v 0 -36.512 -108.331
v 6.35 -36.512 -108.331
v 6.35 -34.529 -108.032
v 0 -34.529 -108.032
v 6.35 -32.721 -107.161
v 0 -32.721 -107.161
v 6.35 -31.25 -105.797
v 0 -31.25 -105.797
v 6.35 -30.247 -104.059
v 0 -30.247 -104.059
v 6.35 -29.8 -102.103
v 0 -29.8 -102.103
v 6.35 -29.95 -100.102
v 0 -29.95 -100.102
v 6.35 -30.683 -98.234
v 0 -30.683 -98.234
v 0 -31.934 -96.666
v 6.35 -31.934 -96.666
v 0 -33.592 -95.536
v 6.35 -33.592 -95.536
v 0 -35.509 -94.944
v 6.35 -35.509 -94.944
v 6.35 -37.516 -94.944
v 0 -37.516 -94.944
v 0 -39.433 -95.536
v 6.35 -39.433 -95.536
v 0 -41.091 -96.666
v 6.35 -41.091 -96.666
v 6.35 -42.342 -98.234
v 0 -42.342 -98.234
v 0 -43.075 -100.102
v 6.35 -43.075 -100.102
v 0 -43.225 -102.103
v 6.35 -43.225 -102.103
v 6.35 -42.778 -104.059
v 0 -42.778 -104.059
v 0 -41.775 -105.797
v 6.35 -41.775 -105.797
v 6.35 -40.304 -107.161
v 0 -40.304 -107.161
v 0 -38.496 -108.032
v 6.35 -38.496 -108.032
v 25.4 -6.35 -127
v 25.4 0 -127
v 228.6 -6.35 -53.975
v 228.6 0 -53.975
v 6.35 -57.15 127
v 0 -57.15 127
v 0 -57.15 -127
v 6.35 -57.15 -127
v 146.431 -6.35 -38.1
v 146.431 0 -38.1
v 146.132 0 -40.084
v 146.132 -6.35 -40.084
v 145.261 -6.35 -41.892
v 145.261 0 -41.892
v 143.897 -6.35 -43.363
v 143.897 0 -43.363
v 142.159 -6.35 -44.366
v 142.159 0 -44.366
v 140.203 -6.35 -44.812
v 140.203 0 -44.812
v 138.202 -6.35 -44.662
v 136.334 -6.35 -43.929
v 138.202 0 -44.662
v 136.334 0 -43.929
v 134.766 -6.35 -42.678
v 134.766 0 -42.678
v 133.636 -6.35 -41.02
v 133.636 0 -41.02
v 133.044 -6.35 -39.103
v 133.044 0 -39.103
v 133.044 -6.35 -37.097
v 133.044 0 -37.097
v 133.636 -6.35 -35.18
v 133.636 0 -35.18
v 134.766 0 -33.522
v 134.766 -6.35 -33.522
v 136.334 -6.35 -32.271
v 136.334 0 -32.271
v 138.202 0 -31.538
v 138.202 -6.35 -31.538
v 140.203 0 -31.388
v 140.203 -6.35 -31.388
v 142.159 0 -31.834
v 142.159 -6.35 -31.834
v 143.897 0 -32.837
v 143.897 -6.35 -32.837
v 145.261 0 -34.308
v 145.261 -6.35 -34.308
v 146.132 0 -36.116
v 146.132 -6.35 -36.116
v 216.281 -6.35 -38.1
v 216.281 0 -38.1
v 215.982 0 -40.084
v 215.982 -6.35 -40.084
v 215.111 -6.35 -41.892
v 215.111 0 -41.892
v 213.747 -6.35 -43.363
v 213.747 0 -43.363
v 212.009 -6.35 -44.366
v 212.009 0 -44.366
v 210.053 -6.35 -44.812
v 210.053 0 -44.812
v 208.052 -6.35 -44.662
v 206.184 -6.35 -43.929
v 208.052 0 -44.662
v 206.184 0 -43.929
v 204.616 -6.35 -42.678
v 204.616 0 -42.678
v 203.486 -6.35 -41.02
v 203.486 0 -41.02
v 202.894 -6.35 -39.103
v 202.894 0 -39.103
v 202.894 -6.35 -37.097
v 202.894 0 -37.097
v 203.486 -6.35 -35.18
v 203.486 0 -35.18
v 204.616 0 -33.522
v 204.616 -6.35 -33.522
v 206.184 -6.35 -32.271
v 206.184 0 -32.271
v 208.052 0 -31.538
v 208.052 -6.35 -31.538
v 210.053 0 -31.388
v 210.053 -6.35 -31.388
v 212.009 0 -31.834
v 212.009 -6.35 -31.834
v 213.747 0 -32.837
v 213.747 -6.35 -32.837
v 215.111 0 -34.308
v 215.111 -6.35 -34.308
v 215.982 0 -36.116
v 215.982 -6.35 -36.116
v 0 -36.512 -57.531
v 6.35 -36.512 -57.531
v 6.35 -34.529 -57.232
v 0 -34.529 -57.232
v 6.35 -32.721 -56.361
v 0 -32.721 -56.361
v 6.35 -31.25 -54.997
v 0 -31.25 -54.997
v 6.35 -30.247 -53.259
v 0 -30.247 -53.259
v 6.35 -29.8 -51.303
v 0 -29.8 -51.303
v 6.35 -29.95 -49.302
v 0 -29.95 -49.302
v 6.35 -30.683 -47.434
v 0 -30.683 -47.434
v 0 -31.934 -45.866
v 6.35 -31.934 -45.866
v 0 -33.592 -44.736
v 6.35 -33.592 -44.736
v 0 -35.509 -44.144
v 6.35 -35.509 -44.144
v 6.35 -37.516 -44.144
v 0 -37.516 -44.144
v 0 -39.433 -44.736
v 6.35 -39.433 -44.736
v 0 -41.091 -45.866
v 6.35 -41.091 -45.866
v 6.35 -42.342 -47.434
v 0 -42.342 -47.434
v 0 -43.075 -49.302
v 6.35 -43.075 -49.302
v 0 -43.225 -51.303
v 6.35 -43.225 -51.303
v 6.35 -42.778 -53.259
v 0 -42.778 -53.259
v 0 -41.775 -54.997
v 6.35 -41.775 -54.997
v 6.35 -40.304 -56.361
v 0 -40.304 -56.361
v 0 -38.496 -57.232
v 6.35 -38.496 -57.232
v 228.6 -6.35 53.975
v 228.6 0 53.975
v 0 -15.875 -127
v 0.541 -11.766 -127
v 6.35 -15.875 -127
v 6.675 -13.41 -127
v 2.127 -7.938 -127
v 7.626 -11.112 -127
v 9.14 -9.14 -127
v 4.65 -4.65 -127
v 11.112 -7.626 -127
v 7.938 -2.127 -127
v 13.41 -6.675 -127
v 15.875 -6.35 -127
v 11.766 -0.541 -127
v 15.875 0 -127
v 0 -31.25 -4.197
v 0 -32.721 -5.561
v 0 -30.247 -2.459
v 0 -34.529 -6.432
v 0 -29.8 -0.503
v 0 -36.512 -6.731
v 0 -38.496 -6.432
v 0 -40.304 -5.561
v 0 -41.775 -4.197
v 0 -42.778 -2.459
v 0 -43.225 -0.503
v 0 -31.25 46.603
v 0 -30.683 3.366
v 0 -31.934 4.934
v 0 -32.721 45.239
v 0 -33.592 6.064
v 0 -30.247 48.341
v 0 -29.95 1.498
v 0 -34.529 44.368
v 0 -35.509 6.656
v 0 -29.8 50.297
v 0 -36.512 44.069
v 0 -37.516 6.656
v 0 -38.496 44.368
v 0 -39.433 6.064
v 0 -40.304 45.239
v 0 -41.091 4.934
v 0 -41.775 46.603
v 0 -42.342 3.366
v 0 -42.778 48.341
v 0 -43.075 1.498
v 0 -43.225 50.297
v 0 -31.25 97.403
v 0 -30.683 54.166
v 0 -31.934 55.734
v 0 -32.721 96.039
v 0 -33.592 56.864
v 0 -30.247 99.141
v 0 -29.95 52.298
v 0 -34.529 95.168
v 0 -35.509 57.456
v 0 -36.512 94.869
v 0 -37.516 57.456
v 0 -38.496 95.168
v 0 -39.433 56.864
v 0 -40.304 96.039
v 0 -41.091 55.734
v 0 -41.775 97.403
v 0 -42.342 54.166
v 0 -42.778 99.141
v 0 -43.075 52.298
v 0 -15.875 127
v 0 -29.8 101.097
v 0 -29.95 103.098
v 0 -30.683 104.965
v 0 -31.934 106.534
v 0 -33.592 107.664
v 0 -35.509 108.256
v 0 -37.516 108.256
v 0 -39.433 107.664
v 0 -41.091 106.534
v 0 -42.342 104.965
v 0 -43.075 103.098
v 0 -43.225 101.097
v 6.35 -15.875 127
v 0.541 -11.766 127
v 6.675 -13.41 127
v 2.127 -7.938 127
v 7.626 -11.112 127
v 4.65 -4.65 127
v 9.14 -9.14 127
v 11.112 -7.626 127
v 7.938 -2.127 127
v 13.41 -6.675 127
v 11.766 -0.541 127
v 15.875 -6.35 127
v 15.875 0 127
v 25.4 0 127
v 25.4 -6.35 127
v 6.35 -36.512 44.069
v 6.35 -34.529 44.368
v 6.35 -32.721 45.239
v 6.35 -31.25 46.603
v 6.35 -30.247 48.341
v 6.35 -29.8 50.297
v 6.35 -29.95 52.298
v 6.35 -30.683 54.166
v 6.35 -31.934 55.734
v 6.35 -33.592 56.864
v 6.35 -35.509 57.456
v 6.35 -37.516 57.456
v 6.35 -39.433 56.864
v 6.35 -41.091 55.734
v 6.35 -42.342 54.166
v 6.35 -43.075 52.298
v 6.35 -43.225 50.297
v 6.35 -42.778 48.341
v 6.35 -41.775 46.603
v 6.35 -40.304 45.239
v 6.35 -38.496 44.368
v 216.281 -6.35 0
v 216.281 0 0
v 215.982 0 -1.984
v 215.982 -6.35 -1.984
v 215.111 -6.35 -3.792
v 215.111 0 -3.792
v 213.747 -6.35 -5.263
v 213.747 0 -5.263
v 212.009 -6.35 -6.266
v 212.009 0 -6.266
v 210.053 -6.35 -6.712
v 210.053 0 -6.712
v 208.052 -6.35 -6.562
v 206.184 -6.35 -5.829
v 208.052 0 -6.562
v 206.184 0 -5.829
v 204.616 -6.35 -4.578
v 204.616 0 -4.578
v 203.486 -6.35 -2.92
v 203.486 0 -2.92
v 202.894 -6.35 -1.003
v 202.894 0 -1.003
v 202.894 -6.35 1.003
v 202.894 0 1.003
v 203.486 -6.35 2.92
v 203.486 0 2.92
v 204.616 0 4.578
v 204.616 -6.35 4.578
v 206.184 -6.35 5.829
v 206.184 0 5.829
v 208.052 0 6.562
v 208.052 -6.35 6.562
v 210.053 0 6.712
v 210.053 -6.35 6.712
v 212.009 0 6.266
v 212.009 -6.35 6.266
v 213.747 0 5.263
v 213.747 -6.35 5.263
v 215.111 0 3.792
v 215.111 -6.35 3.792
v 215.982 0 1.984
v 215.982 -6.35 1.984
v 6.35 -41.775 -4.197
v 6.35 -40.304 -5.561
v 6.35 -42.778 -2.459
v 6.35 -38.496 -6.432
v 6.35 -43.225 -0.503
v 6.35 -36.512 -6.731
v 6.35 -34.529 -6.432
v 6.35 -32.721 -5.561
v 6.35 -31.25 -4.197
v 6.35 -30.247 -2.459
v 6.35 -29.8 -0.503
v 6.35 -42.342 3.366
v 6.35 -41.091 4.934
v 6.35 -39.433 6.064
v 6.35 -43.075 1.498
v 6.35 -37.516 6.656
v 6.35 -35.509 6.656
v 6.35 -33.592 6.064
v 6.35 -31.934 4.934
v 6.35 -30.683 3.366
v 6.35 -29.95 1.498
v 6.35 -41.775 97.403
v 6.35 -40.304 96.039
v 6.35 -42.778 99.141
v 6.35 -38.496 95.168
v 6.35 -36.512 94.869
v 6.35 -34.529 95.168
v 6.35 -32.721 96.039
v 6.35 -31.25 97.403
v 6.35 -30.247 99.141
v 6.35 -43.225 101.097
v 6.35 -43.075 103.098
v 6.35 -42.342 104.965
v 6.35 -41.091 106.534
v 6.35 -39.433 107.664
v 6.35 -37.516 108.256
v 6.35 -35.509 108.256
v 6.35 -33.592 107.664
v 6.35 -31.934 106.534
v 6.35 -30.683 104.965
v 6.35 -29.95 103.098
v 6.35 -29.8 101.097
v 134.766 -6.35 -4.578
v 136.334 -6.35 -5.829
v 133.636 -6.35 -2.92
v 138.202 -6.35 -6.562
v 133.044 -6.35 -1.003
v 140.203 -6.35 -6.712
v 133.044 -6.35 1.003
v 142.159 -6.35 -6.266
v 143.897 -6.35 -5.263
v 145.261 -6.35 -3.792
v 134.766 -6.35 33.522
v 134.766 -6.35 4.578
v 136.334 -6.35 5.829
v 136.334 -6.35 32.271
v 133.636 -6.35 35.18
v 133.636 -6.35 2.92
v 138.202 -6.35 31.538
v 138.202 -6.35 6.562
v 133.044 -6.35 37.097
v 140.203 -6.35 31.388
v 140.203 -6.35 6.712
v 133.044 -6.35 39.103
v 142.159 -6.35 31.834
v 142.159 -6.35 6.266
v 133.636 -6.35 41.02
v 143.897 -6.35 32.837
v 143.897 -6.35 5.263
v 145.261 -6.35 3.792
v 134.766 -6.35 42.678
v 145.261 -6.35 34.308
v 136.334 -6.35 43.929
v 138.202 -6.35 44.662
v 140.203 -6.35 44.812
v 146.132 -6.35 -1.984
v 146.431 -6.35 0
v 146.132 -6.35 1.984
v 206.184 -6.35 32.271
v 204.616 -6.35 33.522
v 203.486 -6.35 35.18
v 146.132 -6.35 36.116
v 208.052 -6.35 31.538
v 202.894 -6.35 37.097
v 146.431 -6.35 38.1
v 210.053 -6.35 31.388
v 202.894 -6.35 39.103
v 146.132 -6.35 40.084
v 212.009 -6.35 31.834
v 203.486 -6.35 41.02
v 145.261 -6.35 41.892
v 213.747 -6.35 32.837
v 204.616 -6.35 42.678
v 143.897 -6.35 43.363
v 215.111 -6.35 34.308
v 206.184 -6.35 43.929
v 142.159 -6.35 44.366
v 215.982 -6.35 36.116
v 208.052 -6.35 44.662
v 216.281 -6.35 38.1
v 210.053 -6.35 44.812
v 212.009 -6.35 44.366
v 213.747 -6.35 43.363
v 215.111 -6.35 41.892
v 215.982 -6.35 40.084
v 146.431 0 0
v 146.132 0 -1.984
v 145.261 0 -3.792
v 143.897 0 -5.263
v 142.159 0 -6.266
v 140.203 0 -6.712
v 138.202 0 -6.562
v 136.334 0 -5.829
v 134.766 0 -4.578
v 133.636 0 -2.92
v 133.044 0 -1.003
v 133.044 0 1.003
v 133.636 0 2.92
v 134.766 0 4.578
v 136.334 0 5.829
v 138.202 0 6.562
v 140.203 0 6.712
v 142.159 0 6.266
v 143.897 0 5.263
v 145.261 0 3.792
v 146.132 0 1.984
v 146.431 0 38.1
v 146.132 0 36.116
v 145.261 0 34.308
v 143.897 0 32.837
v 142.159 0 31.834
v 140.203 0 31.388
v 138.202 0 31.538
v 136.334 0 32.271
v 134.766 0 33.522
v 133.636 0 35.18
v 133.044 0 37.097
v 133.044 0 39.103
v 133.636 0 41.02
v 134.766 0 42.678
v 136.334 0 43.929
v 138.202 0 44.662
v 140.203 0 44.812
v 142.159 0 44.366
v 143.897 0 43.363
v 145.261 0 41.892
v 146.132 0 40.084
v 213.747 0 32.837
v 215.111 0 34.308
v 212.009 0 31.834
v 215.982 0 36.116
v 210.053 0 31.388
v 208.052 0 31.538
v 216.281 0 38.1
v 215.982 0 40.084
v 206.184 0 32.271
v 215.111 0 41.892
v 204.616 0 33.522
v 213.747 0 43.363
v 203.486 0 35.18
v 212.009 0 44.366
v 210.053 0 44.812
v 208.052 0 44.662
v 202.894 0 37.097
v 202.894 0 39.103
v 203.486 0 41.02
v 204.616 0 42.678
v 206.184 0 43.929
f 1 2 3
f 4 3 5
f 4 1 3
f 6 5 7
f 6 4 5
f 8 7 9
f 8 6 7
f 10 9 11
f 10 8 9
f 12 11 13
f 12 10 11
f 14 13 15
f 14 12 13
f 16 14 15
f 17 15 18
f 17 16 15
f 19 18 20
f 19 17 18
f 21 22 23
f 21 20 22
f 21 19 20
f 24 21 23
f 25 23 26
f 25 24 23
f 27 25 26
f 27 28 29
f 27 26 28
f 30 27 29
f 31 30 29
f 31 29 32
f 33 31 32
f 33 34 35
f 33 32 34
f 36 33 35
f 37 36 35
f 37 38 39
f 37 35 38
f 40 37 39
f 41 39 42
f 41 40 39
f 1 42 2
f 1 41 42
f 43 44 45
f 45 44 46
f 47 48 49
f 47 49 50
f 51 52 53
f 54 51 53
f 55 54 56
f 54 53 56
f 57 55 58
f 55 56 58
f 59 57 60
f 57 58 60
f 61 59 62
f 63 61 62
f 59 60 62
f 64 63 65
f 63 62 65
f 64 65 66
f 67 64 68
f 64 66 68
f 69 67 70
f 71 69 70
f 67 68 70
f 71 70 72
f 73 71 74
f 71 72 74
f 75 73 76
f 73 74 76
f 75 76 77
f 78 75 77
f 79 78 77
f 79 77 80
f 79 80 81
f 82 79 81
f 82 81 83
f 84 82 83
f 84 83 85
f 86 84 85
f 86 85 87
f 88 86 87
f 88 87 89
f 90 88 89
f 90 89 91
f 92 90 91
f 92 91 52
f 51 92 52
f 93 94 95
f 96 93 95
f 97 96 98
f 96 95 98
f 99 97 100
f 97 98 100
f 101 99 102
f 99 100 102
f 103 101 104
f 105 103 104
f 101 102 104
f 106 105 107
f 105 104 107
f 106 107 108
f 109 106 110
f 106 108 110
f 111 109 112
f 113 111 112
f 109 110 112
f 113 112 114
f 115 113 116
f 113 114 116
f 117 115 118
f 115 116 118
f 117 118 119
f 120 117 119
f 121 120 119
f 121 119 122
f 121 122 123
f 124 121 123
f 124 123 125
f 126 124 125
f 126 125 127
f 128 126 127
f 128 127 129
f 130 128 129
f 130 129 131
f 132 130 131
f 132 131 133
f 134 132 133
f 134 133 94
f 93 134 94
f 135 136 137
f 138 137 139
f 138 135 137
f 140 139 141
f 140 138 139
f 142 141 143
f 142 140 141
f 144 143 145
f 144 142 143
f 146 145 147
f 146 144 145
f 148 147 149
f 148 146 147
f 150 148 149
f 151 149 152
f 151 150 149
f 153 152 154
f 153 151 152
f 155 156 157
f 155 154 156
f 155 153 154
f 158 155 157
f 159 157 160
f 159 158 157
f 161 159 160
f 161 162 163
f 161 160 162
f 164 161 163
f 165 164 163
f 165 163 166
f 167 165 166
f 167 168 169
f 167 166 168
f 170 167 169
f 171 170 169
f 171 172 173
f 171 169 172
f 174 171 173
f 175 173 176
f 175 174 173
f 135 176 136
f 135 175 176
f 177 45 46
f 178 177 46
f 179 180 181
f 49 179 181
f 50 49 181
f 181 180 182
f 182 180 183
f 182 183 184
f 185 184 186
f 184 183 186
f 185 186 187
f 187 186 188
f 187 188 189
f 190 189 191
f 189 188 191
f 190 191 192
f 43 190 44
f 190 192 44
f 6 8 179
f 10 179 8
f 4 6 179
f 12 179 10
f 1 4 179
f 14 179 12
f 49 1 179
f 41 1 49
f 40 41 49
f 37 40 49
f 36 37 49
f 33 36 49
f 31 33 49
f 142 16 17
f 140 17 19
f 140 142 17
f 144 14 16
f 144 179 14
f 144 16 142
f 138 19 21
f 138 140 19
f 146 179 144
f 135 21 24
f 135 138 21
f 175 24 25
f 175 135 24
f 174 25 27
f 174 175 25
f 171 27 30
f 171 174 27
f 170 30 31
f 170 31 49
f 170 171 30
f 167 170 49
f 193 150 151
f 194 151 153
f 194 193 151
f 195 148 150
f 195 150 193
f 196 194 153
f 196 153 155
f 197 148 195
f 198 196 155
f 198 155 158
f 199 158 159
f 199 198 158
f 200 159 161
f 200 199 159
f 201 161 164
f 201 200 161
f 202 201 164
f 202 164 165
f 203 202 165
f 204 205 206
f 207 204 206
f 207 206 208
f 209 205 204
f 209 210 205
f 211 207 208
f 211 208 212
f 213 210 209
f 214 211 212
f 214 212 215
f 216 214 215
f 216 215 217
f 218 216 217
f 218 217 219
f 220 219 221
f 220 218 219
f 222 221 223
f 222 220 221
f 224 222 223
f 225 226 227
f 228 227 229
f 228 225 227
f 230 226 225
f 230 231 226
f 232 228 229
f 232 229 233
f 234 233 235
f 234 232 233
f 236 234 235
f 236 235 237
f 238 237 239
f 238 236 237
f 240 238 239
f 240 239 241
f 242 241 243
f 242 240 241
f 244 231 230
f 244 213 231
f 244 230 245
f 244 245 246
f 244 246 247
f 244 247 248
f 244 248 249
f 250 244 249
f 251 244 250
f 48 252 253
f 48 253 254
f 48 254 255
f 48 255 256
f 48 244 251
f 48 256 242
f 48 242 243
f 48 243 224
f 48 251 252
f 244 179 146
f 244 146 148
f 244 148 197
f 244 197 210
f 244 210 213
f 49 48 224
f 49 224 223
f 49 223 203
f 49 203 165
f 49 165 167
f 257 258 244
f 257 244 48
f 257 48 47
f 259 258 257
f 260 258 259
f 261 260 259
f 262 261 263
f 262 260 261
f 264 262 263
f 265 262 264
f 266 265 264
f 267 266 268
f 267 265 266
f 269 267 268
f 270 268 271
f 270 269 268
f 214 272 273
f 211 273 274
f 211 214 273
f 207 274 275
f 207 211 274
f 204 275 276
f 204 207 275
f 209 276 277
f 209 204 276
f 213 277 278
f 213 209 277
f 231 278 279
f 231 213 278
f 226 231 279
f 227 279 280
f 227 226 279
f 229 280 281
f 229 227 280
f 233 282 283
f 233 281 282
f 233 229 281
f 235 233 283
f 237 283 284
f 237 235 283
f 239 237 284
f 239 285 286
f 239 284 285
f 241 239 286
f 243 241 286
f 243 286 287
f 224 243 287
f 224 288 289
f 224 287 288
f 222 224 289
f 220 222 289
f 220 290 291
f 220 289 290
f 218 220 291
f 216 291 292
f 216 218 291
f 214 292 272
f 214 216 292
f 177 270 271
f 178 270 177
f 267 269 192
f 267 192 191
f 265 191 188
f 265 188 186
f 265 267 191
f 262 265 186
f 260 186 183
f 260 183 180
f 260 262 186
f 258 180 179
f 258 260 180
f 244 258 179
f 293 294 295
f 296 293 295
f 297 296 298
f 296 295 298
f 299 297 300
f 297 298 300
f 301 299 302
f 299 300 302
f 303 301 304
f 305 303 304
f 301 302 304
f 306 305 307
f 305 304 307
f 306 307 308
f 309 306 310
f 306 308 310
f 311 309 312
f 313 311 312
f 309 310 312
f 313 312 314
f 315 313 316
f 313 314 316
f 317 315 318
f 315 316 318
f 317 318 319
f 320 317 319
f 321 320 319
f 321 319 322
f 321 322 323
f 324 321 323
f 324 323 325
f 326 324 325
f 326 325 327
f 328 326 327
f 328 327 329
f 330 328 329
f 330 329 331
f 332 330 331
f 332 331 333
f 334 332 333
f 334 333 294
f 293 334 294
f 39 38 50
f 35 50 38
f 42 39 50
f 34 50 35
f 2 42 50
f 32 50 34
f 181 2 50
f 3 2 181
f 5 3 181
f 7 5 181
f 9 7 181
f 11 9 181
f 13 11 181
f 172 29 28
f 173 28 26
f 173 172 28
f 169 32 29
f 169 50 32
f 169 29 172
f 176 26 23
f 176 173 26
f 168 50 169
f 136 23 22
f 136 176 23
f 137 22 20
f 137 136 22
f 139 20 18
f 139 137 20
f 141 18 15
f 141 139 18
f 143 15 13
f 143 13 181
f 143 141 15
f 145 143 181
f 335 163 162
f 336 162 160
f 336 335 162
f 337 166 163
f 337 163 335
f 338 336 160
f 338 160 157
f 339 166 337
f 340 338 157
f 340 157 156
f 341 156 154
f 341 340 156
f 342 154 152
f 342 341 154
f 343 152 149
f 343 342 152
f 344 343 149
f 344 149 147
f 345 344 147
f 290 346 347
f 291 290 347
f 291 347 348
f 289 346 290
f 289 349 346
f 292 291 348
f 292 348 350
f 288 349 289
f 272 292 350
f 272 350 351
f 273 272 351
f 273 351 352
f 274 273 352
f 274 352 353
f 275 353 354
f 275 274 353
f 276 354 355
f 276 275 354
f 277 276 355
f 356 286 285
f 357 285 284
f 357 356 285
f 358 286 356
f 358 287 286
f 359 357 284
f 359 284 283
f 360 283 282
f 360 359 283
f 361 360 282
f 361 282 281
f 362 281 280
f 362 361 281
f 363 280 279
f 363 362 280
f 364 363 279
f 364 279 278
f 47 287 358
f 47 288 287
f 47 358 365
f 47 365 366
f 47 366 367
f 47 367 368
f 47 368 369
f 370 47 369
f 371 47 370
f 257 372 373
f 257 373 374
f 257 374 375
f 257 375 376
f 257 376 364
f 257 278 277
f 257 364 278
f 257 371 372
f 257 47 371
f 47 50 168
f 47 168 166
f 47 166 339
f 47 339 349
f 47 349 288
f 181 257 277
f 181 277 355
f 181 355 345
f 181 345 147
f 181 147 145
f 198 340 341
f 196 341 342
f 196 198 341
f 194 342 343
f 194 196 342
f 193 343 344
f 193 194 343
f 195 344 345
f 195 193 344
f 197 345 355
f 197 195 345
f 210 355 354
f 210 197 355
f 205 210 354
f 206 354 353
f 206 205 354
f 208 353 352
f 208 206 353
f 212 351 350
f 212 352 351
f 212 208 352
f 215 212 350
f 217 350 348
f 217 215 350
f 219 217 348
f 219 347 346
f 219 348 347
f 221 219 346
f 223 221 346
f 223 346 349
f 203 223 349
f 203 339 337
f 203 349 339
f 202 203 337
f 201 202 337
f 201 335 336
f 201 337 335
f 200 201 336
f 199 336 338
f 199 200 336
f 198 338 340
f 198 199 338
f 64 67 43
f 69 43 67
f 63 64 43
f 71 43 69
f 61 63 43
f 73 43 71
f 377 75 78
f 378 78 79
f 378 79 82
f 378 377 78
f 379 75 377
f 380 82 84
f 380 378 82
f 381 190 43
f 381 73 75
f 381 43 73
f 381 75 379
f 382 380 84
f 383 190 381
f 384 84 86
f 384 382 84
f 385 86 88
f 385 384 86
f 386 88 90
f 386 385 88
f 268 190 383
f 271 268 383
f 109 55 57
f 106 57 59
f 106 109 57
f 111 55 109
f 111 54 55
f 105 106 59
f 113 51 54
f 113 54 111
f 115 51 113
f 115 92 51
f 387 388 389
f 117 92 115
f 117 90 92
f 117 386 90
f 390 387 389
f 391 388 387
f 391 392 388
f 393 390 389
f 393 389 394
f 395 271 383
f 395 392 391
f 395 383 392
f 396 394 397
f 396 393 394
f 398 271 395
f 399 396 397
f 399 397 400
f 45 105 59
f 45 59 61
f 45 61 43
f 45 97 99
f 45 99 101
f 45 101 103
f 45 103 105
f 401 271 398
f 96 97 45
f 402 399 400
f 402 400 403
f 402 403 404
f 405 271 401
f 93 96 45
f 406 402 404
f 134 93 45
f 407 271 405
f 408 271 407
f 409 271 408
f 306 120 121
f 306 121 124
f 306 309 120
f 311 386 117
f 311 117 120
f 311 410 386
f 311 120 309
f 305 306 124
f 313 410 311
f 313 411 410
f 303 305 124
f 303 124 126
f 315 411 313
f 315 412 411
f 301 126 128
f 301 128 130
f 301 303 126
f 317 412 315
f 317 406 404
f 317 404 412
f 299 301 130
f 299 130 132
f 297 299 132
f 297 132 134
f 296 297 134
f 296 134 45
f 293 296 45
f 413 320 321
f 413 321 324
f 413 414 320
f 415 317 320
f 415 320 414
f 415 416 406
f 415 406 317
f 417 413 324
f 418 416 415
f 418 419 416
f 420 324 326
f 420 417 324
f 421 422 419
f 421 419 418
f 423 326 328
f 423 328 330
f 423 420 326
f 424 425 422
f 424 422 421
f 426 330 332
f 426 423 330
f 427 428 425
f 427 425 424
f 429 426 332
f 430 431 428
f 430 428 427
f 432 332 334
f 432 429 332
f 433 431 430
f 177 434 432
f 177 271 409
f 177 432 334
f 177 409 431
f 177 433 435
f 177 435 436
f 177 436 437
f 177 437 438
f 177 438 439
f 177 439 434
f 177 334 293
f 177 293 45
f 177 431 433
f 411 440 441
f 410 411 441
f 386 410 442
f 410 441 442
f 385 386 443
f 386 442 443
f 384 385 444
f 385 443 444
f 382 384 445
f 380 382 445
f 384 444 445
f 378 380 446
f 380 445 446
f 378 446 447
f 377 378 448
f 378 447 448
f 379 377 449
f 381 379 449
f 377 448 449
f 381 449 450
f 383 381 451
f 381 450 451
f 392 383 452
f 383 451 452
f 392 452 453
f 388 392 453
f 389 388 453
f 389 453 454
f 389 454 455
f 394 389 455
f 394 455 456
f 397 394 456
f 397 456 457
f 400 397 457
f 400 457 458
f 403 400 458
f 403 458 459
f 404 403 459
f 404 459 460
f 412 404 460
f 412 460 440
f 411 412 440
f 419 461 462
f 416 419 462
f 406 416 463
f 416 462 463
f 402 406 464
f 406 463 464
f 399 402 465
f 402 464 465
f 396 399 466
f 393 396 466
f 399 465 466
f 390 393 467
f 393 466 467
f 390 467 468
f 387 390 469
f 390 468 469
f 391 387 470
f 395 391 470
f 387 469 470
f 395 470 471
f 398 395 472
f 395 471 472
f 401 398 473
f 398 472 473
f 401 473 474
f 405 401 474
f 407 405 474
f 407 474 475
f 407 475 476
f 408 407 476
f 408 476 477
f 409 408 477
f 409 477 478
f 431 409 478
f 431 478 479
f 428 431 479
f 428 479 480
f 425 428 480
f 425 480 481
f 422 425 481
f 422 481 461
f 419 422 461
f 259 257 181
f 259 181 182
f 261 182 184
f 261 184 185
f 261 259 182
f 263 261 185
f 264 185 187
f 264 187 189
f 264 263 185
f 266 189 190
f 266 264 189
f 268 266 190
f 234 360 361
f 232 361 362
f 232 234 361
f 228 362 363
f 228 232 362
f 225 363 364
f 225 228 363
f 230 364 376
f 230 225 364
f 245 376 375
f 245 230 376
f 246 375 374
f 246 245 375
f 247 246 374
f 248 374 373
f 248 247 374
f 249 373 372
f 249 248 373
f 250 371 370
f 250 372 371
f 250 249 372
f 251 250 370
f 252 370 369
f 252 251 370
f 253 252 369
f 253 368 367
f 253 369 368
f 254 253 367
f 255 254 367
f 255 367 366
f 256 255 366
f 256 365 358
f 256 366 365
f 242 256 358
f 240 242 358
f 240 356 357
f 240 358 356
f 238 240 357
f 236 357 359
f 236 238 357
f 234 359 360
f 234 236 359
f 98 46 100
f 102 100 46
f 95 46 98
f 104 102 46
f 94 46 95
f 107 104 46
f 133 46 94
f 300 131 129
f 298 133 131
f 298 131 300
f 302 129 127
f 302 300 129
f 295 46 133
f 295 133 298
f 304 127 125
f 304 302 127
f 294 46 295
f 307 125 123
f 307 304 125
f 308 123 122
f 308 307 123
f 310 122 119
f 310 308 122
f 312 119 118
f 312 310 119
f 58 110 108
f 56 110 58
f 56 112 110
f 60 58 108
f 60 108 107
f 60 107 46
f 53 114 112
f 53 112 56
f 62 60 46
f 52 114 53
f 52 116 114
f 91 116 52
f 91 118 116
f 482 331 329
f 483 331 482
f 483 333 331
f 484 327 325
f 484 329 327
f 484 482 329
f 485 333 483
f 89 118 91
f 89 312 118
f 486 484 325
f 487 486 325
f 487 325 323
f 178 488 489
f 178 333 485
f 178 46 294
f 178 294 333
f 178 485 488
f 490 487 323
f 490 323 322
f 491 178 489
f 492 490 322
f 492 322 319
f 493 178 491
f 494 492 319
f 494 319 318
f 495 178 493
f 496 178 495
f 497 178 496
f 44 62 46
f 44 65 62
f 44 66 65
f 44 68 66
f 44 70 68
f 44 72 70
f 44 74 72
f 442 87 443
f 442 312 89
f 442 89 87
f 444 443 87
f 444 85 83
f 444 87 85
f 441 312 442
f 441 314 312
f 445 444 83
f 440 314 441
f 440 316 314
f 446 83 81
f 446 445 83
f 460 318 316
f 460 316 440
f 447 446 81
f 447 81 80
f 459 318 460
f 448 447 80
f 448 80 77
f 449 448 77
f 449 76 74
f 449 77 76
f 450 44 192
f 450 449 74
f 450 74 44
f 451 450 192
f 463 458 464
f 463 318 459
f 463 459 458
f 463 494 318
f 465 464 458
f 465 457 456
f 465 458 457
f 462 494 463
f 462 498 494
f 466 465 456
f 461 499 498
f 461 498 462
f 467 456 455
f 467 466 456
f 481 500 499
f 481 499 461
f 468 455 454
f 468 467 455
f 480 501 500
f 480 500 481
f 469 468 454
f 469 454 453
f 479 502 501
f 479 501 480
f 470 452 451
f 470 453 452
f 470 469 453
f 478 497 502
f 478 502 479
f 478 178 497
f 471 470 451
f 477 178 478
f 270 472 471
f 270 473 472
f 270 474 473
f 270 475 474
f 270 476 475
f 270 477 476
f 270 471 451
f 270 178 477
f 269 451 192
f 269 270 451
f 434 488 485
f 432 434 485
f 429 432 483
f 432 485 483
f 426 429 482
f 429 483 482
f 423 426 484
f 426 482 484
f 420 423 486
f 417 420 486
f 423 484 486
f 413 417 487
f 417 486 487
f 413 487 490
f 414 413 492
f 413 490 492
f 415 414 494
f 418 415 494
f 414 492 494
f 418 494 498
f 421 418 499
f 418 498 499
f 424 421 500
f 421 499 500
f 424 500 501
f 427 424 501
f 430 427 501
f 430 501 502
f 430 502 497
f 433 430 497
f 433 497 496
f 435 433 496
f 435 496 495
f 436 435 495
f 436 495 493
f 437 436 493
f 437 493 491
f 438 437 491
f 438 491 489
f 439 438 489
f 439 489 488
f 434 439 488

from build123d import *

# Parameters (mm, degrees)
EXTRUDE1_DEPTH         = 127
SKETCH2_R              = 6.731
CUT_CHAMFER_DEPTH      = 508
CUT_CHAMFER_DEPTH_BACK = 58.15
SKETCH3_R              = 6.731
CUT_HOLES_DEPTH        = 229.6


with BuildPart() as part:
    # Sketch1 → Extrude1 (new body, symmetric)
    with BuildSketch(Plane.XY):
        with BuildLine():
            Line((228.6, 0), (15.875, 0))
            ThreePointArc((15.875, 0), (4.649679849, -4.649679849), (0, -15.875))
            Line((0, -15.875), (0, -57.15))
            Line((0, -57.15), (6.35, -57.15))
            Line((6.35, -57.15), (6.35, -15.875))
            ThreePointArc((6.35, -15.875), (9.139807909, -9.139807909), (15.875, -6.35))
            Line((15.875, -6.35), (228.6, -6.35))
            Line((228.6, -6.35), (228.6, 0))
        make_face()
    extrude(amount=EXTRUDE1_DEPTH, both=True)

    # Sketch2 → Cut-Chamfer (cut, two sides)
    with BuildSketch(Plane(origin=(0, 0, 0), x_dir=(1, 0, 0), z_dir=(0, 1, 0))) as cut_chamfer_sk:
        with Locations((209.55, 38.1)):
            Circle(SKETCH2_R)
        with Locations((139.7, 38.1)):
            Circle(SKETCH2_R)
        with Locations((209.55, 0)):
            Circle(SKETCH2_R)
        with Locations((139.7, 0)):
            Circle(SKETCH2_R)
        with Locations((139.7, -38.1)):
            Circle(SKETCH2_R)
        with Locations((209.55, -38.1)):
            Circle(SKETCH2_R)
        Polygon((25.4, 127), (228.6, 53.975), (228.6, 127), align=None)
        Polygon((228.6, -53.975), (228.6, -127), (25.4, -127), align=None)
    extrude(amount=CUT_CHAMFER_DEPTH, mode=Mode.SUBTRACT)
    extrude(cut_chamfer_sk.sketch, amount=-CUT_CHAMFER_DEPTH_BACK, mode=Mode.SUBTRACT)

    # Sketch3 → Cut-Holes (cut, through all)
    with BuildSketch(Plane(origin=(0, 0, 0), x_dir=(0, 0, -1), z_dir=(1, 0, 0))):
        with Locations((0, -36.5125)):
            Circle(SKETCH3_R)
        with Locations((101.6, -36.5125)):
            Circle(SKETCH3_R)
        with Locations((0, -150.8125)):
            Circle(SKETCH3_R)
        with Locations((101.6, -150.8125)):
            Circle(SKETCH3_R)
        with Locations((-101.6, -36.5125)):
            Circle(SKETCH3_R)
        with Locations((-101.6, -150.8125)):
            Circle(SKETCH3_R)
        with Locations((-50.8, -36.5125)):
            Circle(SKETCH3_R)
        with Locations((50.8, -36.5125)):
            Circle(SKETCH3_R)
        with Locations((50.8, -150.8125)):
            Circle(SKETCH3_R)
        with Locations((-50.8, -150.8125)):
            Circle(SKETCH3_R)
    extrude(amount=CUT_HOLES_DEPTH, mode=Mode.SUBTRACT)


solid = part.part
